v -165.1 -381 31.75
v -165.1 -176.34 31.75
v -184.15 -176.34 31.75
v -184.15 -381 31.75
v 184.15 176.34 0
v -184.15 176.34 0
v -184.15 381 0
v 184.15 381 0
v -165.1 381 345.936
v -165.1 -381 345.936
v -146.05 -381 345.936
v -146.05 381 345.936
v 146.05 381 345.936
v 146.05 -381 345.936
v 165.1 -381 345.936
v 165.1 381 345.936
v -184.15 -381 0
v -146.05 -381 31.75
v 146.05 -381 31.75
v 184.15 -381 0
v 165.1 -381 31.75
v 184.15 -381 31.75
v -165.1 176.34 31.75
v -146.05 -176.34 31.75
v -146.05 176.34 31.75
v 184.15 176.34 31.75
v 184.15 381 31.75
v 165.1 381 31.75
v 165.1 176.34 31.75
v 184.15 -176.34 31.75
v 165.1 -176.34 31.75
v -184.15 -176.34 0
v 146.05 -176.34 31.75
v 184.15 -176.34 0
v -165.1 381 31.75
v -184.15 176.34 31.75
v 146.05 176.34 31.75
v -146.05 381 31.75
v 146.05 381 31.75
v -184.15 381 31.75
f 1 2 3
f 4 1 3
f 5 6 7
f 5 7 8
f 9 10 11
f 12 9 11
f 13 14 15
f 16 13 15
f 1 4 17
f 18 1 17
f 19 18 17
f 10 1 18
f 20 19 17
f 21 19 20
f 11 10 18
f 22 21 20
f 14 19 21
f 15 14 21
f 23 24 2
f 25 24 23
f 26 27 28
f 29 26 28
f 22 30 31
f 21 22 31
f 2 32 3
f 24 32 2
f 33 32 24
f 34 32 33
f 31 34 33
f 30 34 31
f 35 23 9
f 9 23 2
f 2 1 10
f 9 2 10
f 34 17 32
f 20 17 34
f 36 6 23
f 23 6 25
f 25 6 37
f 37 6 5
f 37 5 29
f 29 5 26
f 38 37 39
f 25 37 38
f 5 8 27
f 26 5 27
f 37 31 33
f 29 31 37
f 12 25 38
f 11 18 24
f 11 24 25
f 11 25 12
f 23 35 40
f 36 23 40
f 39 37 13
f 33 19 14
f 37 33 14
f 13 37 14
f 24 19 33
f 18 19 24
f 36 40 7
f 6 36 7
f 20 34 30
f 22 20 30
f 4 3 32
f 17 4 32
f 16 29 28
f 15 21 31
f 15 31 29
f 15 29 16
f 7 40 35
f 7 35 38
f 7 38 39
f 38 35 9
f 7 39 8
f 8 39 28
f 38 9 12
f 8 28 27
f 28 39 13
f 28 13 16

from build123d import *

# Parameters (mm, degrees)
F0_W     = 19.05
F0_H     = 314.1864430949
F1_DEPTH = 381
F2_W     = 352.679
F2_H     = 31.75
F3_DEPTH = 184.15


with BuildPart() as f1:
    # F0 (on Front) → F1 (new body, symmetric)
    with BuildSketch(Plane.XZ):
        Polygon((-184.15, 0), (0, 0), (184.15, 0), (184.15, 31.75), (165.1, 31.75), (146.05, 31.75), (-146.05, 31.75), (-165.1, 31.75), (-184.15, 31.75), align=None)
        with Locations((155.575, 188.8432215475)):
            Rectangle(F0_W, F0_H)
        with Locations((-155.575, 188.8432215475)):
            Rectangle(F0_W, F0_H)
    extrude(amount=F1_DEPTH, both=True)

    # F2 (on Right) → F3 (cut, symmetric)
    with BuildSketch(Plane.YZ):
        with Locations((0, 15.875)):
            Rectangle(F2_W, F2_H)
    extrude(amount=F3_DEPTH, both=True, mode=Mode.SUBTRACT)


solid = f1.part
